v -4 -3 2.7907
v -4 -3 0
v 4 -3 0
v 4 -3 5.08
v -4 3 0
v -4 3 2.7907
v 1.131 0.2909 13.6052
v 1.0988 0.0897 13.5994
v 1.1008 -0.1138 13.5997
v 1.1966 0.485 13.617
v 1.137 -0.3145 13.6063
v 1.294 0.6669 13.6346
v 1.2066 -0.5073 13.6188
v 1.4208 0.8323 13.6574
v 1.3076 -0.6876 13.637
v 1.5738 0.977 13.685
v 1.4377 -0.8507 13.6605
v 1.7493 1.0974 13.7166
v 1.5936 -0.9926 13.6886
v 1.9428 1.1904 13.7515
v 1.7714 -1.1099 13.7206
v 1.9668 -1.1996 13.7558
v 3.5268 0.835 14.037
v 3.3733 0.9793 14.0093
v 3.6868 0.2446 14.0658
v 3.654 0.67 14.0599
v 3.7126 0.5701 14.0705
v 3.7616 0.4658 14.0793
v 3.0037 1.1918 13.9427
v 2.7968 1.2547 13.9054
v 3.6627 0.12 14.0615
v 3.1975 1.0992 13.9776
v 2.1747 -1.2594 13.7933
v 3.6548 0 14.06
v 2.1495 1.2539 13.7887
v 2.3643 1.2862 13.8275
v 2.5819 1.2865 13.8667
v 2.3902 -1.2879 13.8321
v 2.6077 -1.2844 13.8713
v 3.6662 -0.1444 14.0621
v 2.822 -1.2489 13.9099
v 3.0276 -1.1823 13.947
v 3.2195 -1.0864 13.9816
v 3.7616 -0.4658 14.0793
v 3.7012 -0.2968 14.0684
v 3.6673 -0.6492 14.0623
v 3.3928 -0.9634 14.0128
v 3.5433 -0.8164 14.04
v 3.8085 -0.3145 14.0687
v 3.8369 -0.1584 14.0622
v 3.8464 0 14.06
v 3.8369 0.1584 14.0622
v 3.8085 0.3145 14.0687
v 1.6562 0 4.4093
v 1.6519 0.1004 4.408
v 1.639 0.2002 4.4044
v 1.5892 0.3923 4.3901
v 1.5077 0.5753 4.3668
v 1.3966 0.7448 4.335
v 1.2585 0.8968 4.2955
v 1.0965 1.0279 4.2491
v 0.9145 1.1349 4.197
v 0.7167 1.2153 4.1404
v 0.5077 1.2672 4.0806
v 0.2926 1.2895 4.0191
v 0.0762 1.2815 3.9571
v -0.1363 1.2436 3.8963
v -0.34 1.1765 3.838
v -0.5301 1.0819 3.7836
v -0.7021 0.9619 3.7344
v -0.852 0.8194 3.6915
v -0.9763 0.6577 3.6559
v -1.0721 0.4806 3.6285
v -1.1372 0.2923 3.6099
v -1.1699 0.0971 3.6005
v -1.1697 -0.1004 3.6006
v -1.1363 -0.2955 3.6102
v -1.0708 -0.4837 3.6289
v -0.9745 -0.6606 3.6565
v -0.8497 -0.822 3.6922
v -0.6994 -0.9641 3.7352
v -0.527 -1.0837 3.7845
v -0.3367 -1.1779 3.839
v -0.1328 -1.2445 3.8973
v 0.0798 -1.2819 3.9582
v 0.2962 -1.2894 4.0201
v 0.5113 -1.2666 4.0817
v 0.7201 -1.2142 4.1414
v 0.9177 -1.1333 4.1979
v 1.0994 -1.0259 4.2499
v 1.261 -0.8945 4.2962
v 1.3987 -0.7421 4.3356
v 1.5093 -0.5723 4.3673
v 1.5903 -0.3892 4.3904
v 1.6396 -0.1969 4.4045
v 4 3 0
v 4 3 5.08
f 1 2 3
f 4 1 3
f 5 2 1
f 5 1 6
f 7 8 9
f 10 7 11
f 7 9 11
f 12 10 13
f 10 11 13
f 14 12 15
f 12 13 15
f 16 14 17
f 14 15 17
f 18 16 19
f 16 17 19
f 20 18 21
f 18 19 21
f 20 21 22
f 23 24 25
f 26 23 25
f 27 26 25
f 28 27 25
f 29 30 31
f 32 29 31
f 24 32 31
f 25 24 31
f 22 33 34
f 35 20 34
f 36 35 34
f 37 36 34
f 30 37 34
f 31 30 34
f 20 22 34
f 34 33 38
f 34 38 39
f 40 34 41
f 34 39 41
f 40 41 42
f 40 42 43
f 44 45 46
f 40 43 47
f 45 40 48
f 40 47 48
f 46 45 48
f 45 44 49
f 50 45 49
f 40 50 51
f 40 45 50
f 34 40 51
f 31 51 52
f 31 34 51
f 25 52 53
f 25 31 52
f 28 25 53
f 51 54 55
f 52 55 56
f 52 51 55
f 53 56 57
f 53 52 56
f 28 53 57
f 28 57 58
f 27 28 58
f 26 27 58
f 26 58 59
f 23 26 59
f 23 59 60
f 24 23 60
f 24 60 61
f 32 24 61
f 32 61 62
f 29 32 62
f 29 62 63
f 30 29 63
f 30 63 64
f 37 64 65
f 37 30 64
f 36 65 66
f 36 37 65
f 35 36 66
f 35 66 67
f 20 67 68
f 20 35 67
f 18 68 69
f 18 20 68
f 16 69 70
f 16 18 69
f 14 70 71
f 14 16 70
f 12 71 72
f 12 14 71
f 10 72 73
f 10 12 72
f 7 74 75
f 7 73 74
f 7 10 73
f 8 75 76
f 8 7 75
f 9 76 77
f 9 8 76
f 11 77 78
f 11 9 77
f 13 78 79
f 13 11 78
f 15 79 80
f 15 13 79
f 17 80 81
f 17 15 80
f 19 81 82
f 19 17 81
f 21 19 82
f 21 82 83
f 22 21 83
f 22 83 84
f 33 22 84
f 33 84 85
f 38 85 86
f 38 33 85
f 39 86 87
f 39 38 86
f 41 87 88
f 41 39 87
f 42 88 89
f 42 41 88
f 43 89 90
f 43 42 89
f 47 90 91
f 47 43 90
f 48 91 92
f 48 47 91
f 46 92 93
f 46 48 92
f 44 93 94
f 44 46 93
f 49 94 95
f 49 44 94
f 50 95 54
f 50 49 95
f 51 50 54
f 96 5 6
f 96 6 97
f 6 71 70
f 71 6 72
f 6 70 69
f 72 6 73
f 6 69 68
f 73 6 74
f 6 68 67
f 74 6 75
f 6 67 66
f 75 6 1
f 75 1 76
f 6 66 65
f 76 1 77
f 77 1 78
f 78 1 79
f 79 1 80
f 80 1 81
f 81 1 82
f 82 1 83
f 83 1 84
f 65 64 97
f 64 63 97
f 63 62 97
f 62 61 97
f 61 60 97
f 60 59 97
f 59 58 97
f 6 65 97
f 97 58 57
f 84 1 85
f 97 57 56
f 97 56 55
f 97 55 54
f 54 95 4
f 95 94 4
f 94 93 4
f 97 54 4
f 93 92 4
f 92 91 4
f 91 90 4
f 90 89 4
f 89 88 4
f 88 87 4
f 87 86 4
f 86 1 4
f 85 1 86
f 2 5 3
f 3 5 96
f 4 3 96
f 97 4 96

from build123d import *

# Parameters (mm, degrees)
F0_W     = 8
F0_H     = 6
F1_DEPTH = 5.08
F3_DEPTH = 25.4
F7_DEPTH = 12.7


with BuildPart() as f1:
    # F0 (on Top) → F1 (new body)
    with BuildSketch(Plane.XY):
        Rectangle(F0_W, F0_H)
    extrude(amount=F1_DEPTH)

    # F2 (on face) → F3 (cut)
    with BuildSketch(Plane.XZ.offset(3)):
        Polygon((-4, 2.7906689793), (4, 5.08), (-4, 5.08), align=None)
    extrude(amount=-F3_DEPTH, mode=Mode.SUBTRACT)

    # F4 (on Front) → F5 (revolve)
    with BuildSketch(Plane.XZ):
        Polygon((2.5232785847, 14.0600437298), (0, 2.9419534787), (1.2592966668, 2.6605941821), (3.8464304525, 14.0600437298), align=None)
    revolve(axis=Axis((1.2616392924, 0, 8.5009986043), (0.221324163, 0, 0.9752002947)))

    # F6 (on Front) → F7 (cut, symmetric)
    with BuildSketch(Plane.XZ):
        Polygon((2.4923852179, 17.2210689634), (-1.6191779869, 13.1095070392), (7.5650927611, 14.7648118436), align=None)
    extrude(amount=F7_DEPTH, both=True, mode=Mode.SUBTRACT)


solid = f1.part
